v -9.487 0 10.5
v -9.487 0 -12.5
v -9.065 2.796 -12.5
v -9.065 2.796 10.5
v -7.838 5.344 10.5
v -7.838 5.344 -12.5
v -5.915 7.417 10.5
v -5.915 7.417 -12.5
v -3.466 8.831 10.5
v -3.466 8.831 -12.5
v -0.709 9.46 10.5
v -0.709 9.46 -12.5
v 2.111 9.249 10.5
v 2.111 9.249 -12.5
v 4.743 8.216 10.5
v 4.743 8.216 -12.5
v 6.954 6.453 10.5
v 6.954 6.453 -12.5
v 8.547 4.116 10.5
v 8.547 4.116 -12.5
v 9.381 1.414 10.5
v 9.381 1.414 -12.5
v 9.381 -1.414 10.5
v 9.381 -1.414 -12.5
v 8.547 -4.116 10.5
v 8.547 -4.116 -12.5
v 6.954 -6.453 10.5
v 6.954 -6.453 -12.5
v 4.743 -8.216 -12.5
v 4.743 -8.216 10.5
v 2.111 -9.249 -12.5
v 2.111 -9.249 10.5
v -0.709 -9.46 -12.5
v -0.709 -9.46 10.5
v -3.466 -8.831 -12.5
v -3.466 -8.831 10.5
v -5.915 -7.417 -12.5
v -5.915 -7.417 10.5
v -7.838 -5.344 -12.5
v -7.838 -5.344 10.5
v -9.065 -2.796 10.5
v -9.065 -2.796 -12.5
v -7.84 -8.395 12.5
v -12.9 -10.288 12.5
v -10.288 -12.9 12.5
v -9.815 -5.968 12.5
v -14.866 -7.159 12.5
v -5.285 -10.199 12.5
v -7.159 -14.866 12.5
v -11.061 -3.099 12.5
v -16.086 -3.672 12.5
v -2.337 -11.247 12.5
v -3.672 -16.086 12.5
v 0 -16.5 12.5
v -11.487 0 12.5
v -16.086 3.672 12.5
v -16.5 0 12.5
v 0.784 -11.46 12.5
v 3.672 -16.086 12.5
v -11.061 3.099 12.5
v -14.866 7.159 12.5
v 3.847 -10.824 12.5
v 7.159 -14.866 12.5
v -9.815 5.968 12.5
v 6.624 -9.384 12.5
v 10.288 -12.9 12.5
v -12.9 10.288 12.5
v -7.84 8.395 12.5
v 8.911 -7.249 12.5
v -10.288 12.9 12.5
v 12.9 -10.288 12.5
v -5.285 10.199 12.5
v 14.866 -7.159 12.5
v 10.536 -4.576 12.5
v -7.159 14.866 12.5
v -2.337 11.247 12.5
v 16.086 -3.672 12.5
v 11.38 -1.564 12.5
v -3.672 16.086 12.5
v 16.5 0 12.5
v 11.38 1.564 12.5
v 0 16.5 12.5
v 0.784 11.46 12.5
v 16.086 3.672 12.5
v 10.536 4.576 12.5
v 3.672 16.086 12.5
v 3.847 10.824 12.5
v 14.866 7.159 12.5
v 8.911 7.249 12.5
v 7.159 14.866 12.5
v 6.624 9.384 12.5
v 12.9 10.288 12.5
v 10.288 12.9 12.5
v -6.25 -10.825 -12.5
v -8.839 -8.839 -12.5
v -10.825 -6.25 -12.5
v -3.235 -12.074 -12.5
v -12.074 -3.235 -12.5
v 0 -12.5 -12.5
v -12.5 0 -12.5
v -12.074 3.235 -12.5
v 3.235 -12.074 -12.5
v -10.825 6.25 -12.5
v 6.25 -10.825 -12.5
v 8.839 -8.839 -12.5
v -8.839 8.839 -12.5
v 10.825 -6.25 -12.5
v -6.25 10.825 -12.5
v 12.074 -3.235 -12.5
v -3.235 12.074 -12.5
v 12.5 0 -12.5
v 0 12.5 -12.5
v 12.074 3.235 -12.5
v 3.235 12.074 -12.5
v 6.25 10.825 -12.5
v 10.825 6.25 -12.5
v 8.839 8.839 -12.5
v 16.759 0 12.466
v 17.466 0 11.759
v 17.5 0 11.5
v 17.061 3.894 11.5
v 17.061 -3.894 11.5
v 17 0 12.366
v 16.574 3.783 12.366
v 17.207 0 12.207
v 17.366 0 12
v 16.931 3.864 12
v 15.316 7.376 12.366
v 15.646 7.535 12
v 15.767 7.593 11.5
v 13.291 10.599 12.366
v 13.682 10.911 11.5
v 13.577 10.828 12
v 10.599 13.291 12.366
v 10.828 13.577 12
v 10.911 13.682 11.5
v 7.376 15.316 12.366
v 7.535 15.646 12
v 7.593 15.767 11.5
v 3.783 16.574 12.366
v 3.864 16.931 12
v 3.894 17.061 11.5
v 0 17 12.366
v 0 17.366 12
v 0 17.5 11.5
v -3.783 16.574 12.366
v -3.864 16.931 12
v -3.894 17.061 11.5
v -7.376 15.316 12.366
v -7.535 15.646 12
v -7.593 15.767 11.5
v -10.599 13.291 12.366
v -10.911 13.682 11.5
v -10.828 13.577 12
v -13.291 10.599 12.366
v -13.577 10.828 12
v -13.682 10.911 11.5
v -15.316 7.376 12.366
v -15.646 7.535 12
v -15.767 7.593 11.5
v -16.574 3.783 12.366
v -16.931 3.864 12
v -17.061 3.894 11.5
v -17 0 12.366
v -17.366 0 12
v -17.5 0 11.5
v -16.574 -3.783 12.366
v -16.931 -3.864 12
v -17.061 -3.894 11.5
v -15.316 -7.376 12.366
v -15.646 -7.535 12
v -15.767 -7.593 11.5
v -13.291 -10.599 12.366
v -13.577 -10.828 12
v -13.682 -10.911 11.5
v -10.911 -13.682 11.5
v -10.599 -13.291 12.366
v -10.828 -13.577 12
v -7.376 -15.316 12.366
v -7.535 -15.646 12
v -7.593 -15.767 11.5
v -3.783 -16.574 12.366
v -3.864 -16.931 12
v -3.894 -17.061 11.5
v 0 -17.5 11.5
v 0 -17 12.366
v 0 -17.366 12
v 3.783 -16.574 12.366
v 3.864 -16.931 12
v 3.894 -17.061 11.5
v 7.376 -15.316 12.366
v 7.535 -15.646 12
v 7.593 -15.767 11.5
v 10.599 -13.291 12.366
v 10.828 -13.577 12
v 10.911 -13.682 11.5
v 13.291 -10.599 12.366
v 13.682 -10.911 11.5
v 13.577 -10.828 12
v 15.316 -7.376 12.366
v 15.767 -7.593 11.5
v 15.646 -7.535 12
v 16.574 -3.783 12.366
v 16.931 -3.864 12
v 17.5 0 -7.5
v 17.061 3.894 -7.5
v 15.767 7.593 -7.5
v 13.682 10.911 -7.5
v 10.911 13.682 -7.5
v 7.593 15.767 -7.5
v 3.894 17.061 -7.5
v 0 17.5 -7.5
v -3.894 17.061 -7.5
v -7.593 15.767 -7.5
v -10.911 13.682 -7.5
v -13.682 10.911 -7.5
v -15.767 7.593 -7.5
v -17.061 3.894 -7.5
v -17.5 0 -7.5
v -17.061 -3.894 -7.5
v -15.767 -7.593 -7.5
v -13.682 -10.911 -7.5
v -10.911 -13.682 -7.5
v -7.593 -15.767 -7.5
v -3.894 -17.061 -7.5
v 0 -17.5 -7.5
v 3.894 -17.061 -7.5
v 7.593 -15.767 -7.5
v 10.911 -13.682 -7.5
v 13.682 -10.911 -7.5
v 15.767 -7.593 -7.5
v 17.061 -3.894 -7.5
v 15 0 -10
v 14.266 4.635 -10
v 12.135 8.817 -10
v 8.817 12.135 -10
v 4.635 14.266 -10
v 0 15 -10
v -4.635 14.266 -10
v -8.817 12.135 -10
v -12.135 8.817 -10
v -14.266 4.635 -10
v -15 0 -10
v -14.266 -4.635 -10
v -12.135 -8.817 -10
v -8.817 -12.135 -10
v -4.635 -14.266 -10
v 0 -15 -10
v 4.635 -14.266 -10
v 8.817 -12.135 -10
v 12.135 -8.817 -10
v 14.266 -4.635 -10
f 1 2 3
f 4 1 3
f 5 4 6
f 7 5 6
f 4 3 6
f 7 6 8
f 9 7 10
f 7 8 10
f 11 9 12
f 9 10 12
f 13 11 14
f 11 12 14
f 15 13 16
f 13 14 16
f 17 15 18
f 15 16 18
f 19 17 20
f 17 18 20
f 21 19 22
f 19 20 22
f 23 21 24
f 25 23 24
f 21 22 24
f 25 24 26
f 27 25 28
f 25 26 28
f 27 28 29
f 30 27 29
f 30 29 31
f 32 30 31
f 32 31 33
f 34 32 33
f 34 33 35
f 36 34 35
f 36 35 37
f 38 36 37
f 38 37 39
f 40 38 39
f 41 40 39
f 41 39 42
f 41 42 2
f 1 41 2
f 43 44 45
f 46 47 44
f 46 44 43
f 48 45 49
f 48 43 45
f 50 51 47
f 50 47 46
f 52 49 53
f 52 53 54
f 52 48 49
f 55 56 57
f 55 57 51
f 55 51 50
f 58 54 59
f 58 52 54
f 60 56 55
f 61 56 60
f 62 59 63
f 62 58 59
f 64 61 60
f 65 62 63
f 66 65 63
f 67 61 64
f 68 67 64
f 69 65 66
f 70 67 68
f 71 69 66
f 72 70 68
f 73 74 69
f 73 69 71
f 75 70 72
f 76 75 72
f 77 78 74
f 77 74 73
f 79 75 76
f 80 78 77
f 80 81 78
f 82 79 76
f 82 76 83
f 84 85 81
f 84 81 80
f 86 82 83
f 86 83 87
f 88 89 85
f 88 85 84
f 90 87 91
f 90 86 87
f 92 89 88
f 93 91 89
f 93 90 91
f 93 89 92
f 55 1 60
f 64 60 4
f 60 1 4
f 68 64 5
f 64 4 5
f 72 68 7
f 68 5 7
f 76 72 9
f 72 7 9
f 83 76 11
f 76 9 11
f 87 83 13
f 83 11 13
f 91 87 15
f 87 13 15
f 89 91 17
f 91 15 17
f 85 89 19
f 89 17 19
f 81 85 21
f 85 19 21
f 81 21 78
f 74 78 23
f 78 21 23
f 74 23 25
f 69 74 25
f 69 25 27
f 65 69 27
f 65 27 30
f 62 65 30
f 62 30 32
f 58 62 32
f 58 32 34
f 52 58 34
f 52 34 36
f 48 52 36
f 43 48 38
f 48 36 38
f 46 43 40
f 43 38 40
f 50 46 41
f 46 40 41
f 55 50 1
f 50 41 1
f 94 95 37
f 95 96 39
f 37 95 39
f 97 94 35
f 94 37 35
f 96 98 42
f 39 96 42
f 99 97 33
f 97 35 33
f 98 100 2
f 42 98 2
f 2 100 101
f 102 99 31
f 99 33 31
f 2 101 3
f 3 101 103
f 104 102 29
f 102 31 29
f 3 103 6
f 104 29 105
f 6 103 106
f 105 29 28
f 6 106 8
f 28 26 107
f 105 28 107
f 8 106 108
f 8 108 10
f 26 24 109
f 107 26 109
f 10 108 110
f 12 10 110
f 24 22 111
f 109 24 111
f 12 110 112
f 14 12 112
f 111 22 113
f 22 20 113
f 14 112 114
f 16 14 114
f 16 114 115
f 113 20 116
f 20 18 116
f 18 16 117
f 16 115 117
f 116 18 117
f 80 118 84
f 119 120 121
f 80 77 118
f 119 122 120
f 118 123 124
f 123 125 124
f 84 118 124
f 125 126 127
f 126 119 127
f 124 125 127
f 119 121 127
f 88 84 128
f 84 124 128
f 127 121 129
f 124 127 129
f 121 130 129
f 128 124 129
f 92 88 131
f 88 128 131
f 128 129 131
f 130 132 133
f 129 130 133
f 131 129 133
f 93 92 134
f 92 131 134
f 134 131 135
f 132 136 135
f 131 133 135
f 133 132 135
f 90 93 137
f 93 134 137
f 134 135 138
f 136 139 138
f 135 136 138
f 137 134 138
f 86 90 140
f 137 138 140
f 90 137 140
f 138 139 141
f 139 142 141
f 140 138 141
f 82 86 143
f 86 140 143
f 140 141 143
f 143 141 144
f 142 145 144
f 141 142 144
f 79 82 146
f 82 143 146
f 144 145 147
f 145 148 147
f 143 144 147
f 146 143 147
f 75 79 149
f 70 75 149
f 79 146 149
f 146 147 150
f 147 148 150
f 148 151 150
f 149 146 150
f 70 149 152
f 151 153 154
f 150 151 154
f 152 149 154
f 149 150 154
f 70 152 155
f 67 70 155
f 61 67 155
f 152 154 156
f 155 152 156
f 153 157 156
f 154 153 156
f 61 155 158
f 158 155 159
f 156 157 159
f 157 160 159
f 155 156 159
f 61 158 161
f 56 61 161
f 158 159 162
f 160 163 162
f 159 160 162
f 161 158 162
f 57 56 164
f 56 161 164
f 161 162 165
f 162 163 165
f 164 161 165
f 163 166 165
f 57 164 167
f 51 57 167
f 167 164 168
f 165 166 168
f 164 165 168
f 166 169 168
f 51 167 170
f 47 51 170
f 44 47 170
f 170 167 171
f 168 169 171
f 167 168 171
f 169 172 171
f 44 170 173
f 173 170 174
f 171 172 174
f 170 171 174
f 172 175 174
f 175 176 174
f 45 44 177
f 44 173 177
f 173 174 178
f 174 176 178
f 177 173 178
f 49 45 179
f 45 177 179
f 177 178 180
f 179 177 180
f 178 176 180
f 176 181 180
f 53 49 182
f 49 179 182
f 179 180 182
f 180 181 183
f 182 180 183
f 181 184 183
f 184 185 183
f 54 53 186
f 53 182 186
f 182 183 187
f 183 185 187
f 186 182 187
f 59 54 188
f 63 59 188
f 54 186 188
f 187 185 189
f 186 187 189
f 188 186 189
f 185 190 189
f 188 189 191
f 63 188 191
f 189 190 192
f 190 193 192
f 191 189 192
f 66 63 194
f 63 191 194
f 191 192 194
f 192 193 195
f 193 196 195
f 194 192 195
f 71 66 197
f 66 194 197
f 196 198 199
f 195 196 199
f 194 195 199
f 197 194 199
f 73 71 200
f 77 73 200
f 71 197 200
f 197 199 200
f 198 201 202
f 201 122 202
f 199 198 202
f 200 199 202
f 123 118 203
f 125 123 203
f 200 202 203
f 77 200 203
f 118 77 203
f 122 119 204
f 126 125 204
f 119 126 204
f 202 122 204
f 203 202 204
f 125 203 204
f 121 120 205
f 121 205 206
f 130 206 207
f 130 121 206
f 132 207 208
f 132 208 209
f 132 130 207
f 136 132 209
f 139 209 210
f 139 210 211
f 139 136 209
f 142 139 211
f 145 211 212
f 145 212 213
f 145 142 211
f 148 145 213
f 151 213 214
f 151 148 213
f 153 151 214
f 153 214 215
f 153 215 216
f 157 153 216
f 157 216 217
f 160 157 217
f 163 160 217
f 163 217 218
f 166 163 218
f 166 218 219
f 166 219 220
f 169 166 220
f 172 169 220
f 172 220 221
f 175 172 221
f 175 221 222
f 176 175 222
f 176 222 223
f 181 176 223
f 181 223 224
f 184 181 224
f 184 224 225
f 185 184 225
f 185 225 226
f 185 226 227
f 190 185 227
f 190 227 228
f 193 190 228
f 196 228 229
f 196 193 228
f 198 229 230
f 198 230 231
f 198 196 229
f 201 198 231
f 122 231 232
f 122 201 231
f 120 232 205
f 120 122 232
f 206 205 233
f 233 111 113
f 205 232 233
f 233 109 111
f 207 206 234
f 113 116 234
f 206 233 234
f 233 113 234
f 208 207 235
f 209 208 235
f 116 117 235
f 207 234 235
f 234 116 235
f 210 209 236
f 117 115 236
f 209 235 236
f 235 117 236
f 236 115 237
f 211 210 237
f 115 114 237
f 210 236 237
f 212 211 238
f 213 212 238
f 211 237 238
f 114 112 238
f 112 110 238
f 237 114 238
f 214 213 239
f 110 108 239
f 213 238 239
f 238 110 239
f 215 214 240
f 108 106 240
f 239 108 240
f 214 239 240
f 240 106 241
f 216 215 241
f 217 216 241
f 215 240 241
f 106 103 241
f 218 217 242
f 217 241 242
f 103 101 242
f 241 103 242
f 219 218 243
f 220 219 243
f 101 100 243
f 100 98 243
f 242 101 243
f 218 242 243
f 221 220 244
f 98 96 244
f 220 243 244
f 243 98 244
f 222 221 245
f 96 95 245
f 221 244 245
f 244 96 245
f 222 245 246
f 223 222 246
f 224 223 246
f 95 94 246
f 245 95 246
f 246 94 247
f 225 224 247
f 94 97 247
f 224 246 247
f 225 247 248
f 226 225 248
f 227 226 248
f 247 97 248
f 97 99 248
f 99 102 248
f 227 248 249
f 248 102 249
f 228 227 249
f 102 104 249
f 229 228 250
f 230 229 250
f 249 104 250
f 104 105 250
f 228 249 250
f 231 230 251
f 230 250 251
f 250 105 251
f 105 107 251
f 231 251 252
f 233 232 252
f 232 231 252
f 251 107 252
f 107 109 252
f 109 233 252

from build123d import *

# Parameters (mm, degrees)
SKETCH1_R                        = 17.5
BOSS_EXTRUDE1_DEPTH              = 12.5
F_1_2_14_NPSM_TAPPED_HOLE1_D     = 18.9738
F_1_2_14_NPSM_TAPPED_HOLE1_DEPTH = 47.24908
F_1_2_14_NPSM_TAPPED_HOLE1_TIP   = 5.700304607
CHAMFER1_SIZE                    = 5
CHAMFER2_SIZE                    = 2
FILLET1_R                        = 1


with BuildPart() as part:
    # Sketch1 → Boss-Extrude1 (new body, symmetric)
    with BuildSketch(Plane.XY):
        Circle(SKETCH1_R)
    extrude(amount=BOSS_EXTRUDE1_DEPTH, both=True)

    # 1/2-14 NPSM Tapped Hole1
    with Locations(Plane.XY.offset(12.5)):
        with Locations((0, 0)):
            Hole(F_1_2_14_NPSM_TAPPED_HOLE1_D / 2, depth=F_1_2_14_NPSM_TAPPED_HOLE1_DEPTH)
            with Locations((0, 0, -(F_1_2_14_NPSM_TAPPED_HOLE1_DEPTH + F_1_2_14_NPSM_TAPPED_HOLE1_TIP / 2))):  # 118° drill point
                Cone(0, F_1_2_14_NPSM_TAPPED_HOLE1_D / 2, F_1_2_14_NPSM_TAPPED_HOLE1_TIP, mode=Mode.SUBTRACT)

    # Chamfer1
    chamfer1_edges = [part.edges().sort_by_distance(p)[0] for p in [
        (-17.5, 0, -12.5),
    ]]
    chamfer(chamfer1_edges, length=CHAMFER1_SIZE)

    # Chamfer2
    chamfer2_edges = [part.edges().sort_by_distance(p)[0] for p in [
        (9.4869, 0, 12.5),
    ]]
    chamfer(chamfer2_edges, length=CHAMFER2_SIZE)

    # Fillet1
    fillet1_edges = [part.edges().sort_by_distance(p)[0] for p in [
        (-17.5, 0, 12.5),
    ]]
    fillet(fillet1_edges, radius=FILLET1_R)


solid = part.part
